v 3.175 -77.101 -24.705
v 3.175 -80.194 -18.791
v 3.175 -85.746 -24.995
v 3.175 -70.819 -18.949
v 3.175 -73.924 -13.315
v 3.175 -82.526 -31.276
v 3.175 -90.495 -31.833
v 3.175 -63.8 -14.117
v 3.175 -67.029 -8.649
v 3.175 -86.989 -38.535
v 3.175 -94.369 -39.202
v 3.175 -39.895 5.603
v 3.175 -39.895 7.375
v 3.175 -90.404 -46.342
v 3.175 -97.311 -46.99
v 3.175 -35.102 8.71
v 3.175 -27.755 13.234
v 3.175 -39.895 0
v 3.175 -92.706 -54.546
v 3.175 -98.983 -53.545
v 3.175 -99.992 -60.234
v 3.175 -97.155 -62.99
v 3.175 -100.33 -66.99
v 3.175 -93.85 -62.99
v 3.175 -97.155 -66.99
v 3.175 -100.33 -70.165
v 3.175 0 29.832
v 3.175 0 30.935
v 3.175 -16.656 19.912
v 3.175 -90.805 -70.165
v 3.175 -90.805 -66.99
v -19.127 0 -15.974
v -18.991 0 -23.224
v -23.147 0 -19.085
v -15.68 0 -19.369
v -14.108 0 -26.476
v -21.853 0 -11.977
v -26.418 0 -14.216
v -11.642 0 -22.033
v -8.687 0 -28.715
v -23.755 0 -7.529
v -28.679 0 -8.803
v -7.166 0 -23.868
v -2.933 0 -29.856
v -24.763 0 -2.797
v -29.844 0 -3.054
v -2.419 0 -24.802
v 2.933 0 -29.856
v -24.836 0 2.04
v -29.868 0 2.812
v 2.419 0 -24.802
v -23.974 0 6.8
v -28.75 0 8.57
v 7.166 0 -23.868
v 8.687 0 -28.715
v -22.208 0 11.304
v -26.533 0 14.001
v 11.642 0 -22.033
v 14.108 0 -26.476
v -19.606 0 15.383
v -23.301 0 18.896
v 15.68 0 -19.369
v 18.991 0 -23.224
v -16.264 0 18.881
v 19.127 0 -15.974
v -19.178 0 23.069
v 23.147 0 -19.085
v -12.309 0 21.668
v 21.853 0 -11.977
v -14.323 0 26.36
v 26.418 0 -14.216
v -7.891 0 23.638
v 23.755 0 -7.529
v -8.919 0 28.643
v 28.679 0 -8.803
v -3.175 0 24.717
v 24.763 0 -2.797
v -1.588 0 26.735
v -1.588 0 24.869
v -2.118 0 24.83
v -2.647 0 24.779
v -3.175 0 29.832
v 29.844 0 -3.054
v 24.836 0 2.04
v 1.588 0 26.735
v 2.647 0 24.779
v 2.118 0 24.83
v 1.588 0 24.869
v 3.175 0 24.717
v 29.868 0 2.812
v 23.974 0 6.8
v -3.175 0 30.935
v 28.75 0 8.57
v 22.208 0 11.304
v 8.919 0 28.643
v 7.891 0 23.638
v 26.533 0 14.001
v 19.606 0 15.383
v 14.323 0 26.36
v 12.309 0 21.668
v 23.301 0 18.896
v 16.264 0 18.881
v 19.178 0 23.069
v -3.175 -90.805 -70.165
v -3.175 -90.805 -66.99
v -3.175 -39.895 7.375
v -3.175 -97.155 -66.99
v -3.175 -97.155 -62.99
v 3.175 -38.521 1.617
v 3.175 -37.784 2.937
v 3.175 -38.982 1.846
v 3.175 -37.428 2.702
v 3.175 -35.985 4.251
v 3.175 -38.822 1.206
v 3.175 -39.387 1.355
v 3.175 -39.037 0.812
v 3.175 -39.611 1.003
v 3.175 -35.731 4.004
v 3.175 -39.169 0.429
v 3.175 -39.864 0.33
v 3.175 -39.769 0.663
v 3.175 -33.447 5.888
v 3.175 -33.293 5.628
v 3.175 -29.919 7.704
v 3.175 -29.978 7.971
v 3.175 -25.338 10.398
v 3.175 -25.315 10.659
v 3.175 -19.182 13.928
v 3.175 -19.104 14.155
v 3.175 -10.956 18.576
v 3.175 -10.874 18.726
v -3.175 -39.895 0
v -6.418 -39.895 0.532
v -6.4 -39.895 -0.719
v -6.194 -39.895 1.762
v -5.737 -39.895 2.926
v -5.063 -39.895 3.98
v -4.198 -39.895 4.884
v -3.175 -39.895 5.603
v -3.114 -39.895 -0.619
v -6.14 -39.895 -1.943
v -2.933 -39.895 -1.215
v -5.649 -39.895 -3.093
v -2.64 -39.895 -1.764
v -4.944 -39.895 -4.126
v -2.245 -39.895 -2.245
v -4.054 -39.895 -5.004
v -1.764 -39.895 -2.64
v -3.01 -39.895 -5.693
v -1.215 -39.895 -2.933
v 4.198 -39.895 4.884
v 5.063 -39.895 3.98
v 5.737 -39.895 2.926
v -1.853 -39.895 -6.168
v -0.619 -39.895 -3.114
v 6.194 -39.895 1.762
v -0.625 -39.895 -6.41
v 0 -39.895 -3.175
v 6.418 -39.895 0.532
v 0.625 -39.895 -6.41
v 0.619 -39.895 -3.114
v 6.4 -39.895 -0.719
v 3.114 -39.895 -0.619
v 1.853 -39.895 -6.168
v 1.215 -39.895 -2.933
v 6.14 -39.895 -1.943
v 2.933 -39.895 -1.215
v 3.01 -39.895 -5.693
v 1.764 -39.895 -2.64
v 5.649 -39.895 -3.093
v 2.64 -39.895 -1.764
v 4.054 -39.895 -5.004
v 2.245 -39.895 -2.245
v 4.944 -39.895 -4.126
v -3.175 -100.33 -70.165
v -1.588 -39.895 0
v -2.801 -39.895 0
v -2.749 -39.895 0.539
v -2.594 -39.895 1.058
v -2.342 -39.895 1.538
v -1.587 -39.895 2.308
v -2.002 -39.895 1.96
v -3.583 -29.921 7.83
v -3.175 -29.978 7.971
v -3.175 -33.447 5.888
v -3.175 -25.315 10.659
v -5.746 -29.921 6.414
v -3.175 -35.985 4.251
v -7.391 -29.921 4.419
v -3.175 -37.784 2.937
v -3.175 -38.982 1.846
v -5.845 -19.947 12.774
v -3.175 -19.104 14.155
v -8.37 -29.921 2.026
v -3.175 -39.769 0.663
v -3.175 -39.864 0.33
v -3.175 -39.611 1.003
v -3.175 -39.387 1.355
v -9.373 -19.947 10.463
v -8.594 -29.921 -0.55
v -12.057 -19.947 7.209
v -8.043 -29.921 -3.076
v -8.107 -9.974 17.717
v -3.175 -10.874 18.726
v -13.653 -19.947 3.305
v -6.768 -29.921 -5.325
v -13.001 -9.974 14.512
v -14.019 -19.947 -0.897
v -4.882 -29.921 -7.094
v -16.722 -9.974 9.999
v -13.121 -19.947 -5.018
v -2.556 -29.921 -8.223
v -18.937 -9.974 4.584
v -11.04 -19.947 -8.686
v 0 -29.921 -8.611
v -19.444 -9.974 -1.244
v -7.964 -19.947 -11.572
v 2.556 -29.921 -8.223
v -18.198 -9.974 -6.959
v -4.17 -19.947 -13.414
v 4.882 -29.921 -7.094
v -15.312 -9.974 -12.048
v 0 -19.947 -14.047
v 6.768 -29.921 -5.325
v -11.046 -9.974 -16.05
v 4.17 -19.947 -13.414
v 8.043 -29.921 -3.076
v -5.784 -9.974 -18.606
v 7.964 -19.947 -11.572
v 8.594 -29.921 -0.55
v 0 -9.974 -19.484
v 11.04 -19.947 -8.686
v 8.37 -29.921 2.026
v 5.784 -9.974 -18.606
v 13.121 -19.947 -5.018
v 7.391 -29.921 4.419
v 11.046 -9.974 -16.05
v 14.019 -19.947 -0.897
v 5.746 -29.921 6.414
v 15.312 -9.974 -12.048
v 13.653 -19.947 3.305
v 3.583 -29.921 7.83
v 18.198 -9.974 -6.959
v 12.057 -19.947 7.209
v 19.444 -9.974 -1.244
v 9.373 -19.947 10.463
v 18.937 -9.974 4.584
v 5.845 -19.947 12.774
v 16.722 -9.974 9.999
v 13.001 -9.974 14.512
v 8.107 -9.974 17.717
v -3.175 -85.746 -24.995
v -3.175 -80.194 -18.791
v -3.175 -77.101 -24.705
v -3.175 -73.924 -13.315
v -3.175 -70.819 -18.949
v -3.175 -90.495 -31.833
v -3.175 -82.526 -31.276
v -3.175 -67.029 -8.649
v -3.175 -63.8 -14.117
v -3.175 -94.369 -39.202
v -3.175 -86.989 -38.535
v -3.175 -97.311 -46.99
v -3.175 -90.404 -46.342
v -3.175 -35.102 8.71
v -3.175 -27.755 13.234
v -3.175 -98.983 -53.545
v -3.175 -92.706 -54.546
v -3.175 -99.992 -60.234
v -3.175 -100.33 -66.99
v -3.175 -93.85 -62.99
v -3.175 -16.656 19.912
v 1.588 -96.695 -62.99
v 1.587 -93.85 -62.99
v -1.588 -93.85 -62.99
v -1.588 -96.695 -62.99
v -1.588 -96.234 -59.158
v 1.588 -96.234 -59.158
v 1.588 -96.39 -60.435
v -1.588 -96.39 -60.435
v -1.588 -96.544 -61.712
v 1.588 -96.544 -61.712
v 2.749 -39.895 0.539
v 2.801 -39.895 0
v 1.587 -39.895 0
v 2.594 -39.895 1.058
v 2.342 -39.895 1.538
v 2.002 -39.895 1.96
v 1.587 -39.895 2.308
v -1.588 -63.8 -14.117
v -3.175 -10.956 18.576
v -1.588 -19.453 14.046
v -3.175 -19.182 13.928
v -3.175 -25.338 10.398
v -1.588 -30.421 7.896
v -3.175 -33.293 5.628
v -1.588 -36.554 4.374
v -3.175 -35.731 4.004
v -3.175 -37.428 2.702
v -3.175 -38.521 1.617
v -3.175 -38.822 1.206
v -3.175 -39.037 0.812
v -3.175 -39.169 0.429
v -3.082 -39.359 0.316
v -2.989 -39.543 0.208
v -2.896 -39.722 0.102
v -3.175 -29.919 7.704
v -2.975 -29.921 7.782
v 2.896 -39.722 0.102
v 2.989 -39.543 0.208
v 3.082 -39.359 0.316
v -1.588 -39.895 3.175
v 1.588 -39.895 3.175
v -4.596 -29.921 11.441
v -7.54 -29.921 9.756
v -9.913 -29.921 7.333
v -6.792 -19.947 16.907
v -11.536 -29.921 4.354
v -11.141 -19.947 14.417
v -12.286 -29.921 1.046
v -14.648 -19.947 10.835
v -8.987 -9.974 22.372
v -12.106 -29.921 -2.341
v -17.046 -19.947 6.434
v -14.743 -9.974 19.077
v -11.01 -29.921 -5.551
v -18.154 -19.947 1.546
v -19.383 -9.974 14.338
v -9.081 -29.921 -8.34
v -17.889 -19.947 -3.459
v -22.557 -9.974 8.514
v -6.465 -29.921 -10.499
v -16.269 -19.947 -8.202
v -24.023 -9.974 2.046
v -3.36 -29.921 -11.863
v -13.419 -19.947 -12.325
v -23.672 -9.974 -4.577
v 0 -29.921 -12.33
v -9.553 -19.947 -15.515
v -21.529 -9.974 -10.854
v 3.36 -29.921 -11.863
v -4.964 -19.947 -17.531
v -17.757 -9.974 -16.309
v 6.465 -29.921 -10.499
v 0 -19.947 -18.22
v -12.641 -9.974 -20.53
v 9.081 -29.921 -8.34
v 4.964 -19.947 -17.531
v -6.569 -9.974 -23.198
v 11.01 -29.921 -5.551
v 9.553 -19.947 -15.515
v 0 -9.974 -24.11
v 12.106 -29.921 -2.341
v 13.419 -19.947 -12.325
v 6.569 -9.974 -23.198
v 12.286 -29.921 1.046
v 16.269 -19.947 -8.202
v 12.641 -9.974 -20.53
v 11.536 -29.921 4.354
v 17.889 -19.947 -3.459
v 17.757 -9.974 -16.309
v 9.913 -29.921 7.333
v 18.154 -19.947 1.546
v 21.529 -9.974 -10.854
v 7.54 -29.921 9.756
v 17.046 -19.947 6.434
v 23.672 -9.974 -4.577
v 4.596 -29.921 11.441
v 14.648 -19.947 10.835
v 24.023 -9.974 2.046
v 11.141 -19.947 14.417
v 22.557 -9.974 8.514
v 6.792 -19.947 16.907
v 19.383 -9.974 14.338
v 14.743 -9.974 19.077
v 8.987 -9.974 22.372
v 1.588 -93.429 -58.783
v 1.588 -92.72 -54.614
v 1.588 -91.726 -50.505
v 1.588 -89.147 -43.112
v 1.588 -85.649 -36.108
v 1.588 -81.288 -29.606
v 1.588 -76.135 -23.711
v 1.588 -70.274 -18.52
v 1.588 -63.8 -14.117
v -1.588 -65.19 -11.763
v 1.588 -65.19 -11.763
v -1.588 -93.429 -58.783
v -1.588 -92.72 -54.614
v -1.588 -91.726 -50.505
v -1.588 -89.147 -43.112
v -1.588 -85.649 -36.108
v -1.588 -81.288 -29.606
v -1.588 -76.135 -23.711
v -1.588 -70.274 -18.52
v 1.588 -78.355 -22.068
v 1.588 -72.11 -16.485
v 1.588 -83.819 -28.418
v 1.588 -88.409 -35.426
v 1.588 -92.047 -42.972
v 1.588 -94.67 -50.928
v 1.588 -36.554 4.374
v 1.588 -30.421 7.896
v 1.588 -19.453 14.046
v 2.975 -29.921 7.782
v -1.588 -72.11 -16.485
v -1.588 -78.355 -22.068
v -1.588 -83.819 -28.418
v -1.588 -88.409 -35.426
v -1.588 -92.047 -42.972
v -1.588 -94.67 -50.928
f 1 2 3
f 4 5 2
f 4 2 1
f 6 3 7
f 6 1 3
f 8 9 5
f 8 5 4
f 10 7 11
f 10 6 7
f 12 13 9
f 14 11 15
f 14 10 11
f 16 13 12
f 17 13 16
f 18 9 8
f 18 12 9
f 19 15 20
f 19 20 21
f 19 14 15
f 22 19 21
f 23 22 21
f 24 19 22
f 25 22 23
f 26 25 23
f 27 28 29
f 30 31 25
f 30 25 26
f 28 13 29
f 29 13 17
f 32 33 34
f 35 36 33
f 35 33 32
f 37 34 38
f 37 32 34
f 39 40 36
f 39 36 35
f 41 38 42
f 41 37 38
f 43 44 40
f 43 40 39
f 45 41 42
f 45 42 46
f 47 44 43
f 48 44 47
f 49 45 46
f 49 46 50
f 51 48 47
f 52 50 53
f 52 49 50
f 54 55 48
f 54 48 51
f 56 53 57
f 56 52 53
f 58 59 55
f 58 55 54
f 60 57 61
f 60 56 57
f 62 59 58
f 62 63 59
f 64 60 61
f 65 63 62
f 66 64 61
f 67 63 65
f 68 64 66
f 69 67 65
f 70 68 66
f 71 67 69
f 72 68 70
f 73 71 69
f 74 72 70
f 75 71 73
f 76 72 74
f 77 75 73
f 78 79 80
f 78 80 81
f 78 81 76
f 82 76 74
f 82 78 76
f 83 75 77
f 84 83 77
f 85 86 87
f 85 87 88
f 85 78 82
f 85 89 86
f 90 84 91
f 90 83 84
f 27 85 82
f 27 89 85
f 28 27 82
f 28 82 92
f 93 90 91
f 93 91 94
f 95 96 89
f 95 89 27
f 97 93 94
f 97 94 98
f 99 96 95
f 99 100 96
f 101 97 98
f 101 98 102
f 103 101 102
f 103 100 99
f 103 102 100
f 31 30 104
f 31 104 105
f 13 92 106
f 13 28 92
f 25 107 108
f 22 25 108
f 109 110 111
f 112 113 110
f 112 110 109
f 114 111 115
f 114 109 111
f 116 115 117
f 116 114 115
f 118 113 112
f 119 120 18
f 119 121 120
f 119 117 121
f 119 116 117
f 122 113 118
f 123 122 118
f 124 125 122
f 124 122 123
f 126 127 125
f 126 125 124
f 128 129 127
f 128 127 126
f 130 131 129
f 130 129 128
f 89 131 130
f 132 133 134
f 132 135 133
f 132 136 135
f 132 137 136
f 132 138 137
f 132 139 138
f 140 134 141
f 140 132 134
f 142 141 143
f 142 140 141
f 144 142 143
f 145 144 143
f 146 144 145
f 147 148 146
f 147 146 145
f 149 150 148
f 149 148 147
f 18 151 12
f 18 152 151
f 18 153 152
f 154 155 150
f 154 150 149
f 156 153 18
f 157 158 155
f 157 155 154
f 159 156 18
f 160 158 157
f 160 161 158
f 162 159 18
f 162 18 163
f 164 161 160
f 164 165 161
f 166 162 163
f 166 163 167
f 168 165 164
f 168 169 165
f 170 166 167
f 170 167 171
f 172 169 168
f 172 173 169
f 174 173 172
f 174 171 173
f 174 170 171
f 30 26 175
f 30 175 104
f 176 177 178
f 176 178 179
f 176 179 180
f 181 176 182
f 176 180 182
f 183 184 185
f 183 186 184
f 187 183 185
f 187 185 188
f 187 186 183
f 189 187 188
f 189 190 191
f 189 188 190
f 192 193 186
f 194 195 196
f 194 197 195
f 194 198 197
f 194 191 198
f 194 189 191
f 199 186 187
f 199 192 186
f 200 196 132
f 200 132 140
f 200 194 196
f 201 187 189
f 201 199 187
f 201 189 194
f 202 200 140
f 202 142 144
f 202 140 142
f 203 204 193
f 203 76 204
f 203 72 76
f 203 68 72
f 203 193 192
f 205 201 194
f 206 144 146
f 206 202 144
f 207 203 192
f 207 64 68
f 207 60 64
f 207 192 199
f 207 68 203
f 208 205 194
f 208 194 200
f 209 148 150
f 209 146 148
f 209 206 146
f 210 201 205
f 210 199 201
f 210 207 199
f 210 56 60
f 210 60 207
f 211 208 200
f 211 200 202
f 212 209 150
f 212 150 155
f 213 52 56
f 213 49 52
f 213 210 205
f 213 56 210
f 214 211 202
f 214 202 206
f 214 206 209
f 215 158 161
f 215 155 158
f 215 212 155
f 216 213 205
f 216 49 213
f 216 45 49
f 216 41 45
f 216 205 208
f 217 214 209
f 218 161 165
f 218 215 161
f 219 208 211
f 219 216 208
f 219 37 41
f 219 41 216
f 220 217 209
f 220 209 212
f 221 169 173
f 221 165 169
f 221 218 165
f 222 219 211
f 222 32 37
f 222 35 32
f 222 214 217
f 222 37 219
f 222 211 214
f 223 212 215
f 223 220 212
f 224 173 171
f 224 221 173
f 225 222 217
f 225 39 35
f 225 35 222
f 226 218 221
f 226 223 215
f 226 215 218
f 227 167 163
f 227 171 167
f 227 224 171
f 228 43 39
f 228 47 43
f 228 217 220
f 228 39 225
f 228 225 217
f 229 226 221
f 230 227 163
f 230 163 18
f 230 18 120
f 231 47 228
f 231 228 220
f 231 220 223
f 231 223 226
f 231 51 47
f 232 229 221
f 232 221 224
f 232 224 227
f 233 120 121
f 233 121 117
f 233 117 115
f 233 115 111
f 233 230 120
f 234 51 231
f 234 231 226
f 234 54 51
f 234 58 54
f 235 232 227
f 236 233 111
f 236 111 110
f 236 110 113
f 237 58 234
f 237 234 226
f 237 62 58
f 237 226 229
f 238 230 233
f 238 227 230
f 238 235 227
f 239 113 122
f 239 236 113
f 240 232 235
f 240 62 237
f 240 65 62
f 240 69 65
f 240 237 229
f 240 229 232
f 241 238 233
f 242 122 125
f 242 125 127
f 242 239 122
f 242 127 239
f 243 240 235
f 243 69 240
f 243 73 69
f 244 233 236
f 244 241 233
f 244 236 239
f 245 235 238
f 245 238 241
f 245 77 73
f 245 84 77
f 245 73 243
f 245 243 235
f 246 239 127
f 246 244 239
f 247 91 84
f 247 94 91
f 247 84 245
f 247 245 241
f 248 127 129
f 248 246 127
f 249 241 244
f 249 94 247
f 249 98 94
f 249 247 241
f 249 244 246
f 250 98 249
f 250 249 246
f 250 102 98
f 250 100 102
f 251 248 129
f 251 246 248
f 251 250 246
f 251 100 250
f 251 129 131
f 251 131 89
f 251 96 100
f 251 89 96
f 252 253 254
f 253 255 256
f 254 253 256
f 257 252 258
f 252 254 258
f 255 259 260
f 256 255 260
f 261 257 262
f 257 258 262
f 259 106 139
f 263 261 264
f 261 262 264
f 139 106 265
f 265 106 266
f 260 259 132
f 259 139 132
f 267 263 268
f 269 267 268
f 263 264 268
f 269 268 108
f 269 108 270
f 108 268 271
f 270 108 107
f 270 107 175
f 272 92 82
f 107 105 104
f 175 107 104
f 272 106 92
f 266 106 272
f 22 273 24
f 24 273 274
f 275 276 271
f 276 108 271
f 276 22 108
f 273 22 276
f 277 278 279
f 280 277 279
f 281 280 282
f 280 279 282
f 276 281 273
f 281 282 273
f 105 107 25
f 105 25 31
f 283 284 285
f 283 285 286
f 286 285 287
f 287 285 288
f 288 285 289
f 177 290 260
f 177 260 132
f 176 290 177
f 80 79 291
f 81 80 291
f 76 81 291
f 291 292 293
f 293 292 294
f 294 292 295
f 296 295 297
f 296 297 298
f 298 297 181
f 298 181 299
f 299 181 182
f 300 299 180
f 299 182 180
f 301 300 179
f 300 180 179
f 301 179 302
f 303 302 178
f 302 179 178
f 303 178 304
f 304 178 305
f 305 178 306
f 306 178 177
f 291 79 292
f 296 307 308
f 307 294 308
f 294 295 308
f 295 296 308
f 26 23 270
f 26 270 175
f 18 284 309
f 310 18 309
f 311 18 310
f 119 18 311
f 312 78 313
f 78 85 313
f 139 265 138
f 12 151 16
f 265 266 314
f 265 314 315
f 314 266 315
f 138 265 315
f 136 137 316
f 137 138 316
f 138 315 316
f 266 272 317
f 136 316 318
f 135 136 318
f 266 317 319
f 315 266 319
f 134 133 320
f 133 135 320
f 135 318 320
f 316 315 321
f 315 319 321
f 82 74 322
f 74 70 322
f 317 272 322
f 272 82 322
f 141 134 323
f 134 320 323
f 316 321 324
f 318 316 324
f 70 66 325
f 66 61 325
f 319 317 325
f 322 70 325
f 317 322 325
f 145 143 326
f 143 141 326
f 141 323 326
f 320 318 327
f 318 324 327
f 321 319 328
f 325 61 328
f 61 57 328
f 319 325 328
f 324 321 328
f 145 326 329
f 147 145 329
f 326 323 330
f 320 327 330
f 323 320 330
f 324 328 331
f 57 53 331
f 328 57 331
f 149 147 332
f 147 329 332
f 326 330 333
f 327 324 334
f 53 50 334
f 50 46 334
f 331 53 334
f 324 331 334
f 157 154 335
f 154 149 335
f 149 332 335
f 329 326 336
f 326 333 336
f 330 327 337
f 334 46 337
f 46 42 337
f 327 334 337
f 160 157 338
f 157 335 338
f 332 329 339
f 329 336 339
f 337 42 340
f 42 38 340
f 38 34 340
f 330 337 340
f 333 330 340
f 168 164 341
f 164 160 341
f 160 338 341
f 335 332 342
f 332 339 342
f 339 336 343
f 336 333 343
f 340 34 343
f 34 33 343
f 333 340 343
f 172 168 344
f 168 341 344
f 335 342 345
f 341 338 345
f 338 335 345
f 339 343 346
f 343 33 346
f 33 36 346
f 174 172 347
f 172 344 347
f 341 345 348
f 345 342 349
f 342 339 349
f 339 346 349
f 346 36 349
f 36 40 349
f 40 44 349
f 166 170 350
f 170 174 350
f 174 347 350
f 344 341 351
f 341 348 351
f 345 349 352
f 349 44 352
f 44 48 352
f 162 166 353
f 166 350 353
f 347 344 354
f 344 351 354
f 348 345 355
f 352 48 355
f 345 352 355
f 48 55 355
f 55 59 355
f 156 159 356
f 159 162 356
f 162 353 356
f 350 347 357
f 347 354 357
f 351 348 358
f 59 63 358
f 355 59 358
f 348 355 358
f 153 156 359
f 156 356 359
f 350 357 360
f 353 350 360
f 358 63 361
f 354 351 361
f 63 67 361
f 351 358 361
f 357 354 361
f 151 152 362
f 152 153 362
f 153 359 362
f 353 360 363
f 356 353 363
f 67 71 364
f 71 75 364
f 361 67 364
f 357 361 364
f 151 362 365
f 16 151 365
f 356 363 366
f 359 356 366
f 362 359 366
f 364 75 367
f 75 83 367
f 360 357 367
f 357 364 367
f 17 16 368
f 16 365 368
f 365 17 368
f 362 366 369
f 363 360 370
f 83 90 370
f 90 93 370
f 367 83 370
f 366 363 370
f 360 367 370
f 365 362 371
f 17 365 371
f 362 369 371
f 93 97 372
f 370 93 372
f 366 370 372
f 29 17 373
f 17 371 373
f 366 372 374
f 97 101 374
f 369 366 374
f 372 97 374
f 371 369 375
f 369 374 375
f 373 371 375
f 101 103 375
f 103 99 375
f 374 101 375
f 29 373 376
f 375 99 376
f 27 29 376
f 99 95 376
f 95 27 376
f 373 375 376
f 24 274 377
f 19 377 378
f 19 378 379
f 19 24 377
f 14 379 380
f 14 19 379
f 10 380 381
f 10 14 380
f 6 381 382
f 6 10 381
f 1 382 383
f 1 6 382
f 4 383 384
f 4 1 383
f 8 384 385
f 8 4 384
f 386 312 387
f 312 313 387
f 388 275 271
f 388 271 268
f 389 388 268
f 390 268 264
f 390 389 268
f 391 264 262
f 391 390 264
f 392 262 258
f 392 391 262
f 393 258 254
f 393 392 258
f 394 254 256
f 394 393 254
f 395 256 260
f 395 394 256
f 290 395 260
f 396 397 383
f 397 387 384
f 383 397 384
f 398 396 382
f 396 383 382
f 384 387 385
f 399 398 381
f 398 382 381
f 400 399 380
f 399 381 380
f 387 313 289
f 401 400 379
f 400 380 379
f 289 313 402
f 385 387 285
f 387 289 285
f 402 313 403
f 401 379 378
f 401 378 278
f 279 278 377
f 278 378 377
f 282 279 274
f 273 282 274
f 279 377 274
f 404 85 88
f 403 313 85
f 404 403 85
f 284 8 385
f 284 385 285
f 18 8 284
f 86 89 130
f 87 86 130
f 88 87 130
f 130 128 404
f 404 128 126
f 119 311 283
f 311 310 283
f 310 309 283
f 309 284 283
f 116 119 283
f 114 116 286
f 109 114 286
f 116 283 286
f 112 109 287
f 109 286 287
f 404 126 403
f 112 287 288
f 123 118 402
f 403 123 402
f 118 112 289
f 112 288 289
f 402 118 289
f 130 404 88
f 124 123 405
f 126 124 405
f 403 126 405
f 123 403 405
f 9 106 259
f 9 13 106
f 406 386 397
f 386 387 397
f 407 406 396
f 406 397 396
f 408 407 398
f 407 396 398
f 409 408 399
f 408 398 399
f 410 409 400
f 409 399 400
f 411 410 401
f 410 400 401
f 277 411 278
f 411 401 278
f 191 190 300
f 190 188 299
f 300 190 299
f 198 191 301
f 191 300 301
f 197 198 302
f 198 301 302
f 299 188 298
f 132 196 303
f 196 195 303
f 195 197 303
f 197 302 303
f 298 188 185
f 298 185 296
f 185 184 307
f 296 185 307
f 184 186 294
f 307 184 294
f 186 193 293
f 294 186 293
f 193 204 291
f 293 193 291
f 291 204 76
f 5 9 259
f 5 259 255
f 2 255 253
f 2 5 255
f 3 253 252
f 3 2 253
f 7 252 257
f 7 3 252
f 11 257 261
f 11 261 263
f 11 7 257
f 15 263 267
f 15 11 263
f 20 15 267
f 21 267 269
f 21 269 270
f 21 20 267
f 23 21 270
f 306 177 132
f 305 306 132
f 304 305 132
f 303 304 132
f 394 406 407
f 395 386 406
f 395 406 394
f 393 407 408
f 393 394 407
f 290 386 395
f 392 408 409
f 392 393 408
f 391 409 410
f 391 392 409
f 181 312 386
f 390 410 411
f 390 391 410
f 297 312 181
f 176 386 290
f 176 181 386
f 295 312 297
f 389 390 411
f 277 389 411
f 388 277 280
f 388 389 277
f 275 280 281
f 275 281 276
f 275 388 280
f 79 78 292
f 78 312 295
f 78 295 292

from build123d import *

# Parameters (mm, degrees)
SKETCH5_W           = 12.880016042
SKETCH5_H           = 15.834691301
CUT_EXTRUDE2_DEPTH  = 7.62
BOSS_EXTRUDE1_DEPTH = 3.175
CUT_EXTRUDE4_DEPTH  = 1.5875
SKETCH10_W          = 4
SKETCH10_H          = 3.30542238
CUT_EXTRUDE5_DEPTH  = 34.174999944


with BuildPart() as part:
    # Sketch2 → Revolve1 (revolve)
    with BuildSketch(Plane(origin=(0, 0, 0), x_dir=(0, 0, -1), z_dir=(1, 0, 0))):
        Polygon((0, -50.8), (-29.999999944, 0), (0, 0), align=None)
    revolve(axis=Axis((0, 0, 0), (0, -1, 0)))

    # Sketch4 → Cut-Revolve1 (revolve, cut)
    with BuildSketch(Plane(origin=(0, 0, 0), x_dir=(0, 0, -1), z_dir=(1, 0, 0))):
        Polygon((0, -45.72), (-24.919999944, 0), (0, 0), align=None)
    revolve(axis=Axis((0, 16.11457811, 0), (0, -1, 0)), mode=Mode.SUBTRACT)

    # Sketch5 → Cut-Extrude2 (cut, symmetric)
    with BuildSketch(Plane(origin=(0, 0, 0), x_dir=(0, 0, -1), z_dir=(1, 0, 0))):
        with Locations((0, -47.812265381)):
            Rectangle(SKETCH5_W, SKETCH5_H)
    extrude(amount=CUT_EXTRUDE2_DEPTH, both=True, mode=Mode.SUBTRACT)

    # Sketch6 → Boss-Extrude1 (add, symmetric)
    with BuildSketch(Plane(origin=(0, 0, 0), x_dir=(0, 0, -1), z_dir=(1, 0, 0))):
        with BuildLine():
            Line((0, -39.89491973), (-7.374618631, -39.89491973))
            Line((-7.374618631, -39.89491973), (8.649316149, -67.028782674))
            ThreePointArc((8.649316149, -67.028782674), (24.995151659, -85.745993658), (46.99, -97.31089625))
            ThreePointArc((46.99, -97.31089625), (56.876704451, -99.570972509), (66.99, -100.33))
            Line((66.99, -100.33), (70.165, -100.33))
            Line((70.165, -100.33), (70.165, -90.805))
            Line((70.165, -90.805), (66.99, -90.805))
            Line((66.99, -90.805), (66.99, -93.98))
            ThreePointArc((66.99, -93.98), (36.549925695, -85.903846215), (14.117056519, -63.799802147))
            Line((14.117056519, -63.799802147), (0, -39.89491973))
        make_face()
        Polygon((-30.934610553, 0), (-7.374618631, -39.89491973), (0, -39.89491973), (-23.559991923, 0), align=None)
    extrude(amount=BOSS_EXTRUDE1_DEPTH, both=True)

    # Sketch7 → Cut-Extrude4 (cut)
    with BuildSketch(Plane(origin=(0, 0, 0), x_dir=(0, 0, -1), z_dir=(1, 0, 0))):
        with BuildLine():
            Line((-3.175, -39.89491973), (11.763026223, -65.189977515))
            ThreePointArc((11.763026223, -65.189977515), (31.846754922, -86.228834252), (59.157727955, -96.233853156))
            ThreePointArc((59.157727955, -96.233853156), (63.072632016, -96.704901626), (66.99, -97.155))
            Line((66.99, -97.155), (66.99, -93.98))
            ThreePointArc((66.99, -93.98), (58.670725699, -93.413828019), (50.504865217, -91.725752721))
            ThreePointArc((50.504865217, -91.725752721), (29.605505433, -81.288014454), (14.117056519, -63.799802147))
            Line((14.117056519, -63.799802147), (-23.559991923, 0))
            Line((-23.559991923, 0), (-26.734991923, 0))
            Line((-26.734991923, 0), (-3.175, -39.89491973))
        make_face()
    cut_extrude4 = extrude(amount=-CUT_EXTRUDE4_DEPTH, mode=Mode.SUBTRACT)

    # Mirror1: Cut-Extrude4 across plane
    add(cut_extrude4.mirror(Plane(origin=(0, 0, 0), x_dir=(0, 0, 1), z_dir=(1, 0, 0))), mode=Mode.SUBTRACT)

    # Sketch9 → Cut-Revolve2 (revolve, cut)
    with BuildSketch(Plane(origin=(0, 0, 0), x_dir=(0, 0, -1), z_dir=(1, 0, 0))):
        Polygon((0, 0), (-24.9199908, 0), (-2.801476321, -39.89491973), (0, -39.89491973), align=None)
    revolve(axis=Axis((0, 16.11457811, 0), (0, -1, 0)), mode=Mode.SUBTRACT)

    # Sketch10 → Cut-Extrude5 (cut, through all)
    with BuildSketch(Plane.ZY.offset(3.175)):
        with Locations((-64.99, -95.50228881)):
            Rectangle(SKETCH10_W, SKETCH10_H)
    extrude(amount=-CUT_EXTRUDE5_DEPTH, mode=Mode.SUBTRACT)


solid = part.part
